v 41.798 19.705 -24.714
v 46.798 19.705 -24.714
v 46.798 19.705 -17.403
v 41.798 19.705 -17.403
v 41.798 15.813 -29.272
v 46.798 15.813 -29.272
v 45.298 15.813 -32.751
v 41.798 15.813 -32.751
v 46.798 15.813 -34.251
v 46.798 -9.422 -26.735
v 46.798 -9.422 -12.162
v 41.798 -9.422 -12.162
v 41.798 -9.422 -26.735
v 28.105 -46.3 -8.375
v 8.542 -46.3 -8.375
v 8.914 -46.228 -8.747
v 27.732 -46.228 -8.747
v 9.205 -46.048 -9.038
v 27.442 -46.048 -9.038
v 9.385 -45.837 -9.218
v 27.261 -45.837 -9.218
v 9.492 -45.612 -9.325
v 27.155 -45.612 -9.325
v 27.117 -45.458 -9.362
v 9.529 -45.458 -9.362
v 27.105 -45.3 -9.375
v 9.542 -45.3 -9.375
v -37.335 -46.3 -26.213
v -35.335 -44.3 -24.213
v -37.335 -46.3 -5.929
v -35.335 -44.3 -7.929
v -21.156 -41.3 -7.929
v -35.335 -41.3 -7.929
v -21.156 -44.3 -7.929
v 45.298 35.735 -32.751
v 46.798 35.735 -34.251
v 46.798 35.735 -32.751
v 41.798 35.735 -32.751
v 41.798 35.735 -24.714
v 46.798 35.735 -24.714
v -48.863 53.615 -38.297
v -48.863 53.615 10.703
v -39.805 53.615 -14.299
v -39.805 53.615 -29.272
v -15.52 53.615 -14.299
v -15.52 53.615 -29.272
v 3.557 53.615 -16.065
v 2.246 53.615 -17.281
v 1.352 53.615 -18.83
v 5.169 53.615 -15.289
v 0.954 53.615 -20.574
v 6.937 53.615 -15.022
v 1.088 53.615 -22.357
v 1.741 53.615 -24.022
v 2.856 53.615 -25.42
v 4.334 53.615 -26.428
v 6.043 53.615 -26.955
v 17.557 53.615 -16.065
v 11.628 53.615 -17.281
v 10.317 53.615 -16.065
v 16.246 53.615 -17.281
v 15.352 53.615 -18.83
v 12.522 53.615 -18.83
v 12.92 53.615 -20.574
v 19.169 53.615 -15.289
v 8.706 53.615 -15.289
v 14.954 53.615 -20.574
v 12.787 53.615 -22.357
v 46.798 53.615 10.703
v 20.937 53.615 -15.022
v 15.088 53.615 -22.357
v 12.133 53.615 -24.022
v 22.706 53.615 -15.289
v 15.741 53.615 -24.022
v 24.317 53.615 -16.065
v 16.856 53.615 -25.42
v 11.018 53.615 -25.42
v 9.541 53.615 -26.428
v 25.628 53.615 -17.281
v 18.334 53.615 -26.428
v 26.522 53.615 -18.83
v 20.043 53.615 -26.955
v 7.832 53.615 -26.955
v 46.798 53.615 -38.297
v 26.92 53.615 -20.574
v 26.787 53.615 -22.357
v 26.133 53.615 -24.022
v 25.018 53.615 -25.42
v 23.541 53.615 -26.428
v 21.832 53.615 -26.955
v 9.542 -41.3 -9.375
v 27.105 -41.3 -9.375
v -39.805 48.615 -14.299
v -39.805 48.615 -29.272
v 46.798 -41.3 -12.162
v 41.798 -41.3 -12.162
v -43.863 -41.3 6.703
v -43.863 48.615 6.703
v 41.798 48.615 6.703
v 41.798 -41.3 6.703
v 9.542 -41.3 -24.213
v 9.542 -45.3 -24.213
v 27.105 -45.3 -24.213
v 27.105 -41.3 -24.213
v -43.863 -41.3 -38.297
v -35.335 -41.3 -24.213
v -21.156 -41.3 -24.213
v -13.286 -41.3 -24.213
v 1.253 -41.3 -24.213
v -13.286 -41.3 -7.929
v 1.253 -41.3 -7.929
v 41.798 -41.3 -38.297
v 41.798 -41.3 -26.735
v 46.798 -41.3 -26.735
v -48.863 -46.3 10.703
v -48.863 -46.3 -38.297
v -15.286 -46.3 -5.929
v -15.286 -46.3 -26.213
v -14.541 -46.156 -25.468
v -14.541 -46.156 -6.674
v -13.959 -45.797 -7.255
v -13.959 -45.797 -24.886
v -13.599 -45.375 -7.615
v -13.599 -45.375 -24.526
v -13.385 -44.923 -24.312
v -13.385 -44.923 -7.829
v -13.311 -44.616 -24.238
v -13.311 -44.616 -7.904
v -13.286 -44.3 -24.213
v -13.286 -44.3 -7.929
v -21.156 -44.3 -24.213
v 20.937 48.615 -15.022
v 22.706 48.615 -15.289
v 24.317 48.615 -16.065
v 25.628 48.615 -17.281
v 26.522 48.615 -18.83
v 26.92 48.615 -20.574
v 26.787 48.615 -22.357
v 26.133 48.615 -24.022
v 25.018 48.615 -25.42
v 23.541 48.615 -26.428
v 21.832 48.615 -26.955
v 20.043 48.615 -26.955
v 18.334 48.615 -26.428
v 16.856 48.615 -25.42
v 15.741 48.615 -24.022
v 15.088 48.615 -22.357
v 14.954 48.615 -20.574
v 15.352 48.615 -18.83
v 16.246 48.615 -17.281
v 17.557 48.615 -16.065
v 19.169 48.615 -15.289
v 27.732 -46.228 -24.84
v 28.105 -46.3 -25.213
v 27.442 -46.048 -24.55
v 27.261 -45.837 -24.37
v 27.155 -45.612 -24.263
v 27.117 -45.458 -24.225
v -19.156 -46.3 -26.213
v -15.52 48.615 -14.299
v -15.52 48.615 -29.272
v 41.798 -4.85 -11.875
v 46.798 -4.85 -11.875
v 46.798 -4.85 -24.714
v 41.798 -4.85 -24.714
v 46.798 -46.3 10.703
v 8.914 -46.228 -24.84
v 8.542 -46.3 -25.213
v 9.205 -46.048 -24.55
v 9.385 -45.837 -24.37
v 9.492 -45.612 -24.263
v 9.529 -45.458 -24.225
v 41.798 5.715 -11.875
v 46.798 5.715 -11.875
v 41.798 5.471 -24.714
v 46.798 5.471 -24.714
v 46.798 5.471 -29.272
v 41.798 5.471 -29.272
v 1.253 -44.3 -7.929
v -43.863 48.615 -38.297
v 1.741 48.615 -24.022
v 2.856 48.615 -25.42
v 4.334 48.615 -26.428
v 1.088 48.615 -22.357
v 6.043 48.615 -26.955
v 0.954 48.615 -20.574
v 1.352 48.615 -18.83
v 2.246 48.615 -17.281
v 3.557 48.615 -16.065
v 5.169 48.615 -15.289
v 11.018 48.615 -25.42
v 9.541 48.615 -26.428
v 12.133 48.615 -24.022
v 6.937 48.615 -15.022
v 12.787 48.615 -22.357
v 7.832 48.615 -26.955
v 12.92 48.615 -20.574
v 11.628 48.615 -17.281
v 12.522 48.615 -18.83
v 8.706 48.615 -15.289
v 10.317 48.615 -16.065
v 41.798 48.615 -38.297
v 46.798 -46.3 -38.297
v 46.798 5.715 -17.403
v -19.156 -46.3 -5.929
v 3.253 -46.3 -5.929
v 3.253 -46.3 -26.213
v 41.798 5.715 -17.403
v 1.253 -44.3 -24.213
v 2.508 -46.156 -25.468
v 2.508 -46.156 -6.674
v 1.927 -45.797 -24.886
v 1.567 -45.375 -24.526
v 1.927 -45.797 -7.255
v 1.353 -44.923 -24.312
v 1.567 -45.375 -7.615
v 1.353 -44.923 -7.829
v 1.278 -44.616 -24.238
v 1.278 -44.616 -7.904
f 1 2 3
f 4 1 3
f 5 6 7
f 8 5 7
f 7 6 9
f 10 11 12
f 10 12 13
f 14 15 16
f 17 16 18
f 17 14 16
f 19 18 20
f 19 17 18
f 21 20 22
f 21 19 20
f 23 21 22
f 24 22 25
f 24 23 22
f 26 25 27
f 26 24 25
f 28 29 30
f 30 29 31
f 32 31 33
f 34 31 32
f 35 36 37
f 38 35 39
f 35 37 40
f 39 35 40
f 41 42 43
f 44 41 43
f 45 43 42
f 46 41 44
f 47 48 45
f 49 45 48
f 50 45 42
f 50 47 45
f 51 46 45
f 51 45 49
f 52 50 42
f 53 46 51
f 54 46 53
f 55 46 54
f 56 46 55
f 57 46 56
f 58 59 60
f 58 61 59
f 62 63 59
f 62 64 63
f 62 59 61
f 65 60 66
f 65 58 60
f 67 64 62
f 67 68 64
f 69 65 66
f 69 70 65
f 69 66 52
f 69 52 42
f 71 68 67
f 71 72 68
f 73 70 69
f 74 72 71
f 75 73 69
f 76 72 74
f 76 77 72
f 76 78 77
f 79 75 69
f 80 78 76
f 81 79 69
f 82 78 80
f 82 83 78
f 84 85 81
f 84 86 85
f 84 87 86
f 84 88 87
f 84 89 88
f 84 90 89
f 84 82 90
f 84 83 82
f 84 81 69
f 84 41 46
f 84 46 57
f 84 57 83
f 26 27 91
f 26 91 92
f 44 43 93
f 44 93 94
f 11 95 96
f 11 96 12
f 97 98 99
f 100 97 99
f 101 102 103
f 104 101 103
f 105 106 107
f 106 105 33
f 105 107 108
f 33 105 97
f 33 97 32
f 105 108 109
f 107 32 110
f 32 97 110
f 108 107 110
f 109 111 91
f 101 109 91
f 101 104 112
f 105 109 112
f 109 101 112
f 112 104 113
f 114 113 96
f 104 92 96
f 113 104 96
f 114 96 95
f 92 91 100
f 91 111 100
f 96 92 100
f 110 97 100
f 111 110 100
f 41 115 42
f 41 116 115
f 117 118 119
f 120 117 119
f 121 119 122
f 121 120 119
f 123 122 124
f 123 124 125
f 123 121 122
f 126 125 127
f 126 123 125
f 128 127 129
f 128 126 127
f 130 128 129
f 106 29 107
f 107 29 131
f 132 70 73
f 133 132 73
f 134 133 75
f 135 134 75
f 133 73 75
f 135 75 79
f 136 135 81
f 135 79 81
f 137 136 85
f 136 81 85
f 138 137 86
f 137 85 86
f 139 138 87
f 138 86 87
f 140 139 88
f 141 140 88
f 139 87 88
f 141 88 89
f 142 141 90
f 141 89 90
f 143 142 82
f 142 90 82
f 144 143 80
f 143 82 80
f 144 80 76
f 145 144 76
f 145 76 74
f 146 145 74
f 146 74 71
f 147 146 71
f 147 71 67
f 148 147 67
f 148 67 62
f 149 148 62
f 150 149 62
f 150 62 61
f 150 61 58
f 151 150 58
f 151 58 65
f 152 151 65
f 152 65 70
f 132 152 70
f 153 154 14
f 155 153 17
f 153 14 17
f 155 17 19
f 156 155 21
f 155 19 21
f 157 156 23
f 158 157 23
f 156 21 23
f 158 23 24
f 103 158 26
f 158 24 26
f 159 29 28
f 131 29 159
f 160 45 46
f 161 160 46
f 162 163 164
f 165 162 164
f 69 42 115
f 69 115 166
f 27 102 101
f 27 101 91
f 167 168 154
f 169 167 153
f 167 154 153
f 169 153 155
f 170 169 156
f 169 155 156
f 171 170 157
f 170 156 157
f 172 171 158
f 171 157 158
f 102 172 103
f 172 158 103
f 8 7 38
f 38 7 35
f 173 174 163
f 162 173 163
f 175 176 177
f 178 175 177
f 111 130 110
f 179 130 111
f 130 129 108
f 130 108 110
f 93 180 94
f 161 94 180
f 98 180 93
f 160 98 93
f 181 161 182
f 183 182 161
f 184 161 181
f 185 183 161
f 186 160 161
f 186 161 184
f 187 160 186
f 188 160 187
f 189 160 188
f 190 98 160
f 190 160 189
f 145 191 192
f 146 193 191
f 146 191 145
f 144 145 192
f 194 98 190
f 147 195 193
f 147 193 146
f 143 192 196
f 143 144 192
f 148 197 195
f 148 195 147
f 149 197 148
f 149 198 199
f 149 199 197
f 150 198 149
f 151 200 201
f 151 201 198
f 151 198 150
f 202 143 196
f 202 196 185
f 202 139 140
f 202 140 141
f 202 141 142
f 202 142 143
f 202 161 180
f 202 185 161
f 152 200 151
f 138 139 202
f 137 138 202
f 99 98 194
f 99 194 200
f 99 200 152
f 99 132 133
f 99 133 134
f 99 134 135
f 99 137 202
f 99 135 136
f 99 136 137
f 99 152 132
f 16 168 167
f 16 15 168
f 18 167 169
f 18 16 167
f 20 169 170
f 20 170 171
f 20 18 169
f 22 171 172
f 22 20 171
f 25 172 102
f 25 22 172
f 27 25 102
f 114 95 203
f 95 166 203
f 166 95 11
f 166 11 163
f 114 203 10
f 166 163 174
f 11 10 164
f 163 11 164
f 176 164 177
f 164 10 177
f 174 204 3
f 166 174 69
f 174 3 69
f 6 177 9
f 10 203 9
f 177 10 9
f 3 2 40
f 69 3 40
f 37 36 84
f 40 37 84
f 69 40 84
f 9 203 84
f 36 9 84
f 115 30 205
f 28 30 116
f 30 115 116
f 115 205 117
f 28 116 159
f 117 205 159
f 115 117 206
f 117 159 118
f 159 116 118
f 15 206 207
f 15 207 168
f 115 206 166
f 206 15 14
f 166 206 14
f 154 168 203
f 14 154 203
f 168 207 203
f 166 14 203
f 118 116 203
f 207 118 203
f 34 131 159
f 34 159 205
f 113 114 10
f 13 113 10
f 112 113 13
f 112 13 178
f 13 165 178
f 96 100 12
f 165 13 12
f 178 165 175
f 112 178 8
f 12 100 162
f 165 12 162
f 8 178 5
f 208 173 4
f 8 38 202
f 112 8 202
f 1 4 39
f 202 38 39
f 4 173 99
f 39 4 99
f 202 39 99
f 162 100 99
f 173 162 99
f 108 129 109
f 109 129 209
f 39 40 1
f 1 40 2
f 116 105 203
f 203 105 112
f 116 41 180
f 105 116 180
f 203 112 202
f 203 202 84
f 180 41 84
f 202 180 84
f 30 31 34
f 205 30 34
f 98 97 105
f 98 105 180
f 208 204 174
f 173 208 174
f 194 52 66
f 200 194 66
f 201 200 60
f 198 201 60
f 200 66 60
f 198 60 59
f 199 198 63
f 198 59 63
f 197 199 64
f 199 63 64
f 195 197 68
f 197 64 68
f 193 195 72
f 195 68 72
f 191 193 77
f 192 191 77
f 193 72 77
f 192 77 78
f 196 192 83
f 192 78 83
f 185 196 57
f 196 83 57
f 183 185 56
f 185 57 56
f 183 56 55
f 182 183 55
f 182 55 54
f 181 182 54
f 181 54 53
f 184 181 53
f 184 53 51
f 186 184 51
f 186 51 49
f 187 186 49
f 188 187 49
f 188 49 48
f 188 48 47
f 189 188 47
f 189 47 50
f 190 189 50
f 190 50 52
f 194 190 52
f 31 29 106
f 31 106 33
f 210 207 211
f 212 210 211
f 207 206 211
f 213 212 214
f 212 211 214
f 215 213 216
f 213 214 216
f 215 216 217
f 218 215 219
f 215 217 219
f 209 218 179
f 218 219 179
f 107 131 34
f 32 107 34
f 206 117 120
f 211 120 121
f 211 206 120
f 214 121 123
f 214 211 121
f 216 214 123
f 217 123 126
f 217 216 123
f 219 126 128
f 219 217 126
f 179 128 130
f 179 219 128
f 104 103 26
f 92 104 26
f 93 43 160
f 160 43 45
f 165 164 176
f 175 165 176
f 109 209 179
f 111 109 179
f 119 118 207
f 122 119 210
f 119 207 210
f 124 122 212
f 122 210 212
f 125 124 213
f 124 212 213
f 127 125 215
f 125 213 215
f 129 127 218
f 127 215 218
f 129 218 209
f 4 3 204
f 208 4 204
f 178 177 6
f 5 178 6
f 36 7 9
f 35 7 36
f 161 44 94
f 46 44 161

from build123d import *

# Parameters (mm, degrees)
SCHIZZO2_W                = 95.661065857
SCHIZZO2_H                = 99.914617901
SCHIZZO2_W_2              = 85.661065857
SCHIZZO2_H_2              = 89.914617901
ESTRUSIONE_SOTTILE1_DEPTH = 45
SCHIZZO5_W                = 14.572404991
SCHIZZO5_H                = 31.877712984
TAGLIO_ESTRUSIONE2_DEPTH  = 5
SCHIZZO6_W                = 17.563316518
SCHIZZO6_H                = 14.837974299
SCHIZZO6_W_2              = 14.53926904
SCHIZZO6_H_2              = 16.284185158
SCHIZZO6_W_3              = 14.178791295
TAGLIO_ESTRUSIONE3_DEPTH  = 5
SMUSSO5_SIZE              = 2
SMUSSO6_SIZE              = 1.5
SKETCH1_R                 = 6
SKETCH1_W                 = 24.285177085
SKETCH1_H                 = 14.972609064
CUT_EXTRUDE1_DEPTH        = 10
FILLET1_R                 = 2
FILLET2_R                 = 1
SKETCH2_W                 = 95.661065857
SKETCH2_H                 = 99.914617901
BOSS_EXTRUDE1_DEPTH       = 4


with BuildPart() as part:
    # Schizzo2 → Estrusione-Sottile1 (new body)
    with BuildSketch(Plane.XY.offset(6.703232706)):
        with Locations((-1.032219499, 3.65730895)):
            Rectangle(SCHIZZO2_W, SCHIZZO2_H)
        with Locations((-1.032219499, 3.65730895)):
            Rectangle(SCHIZZO2_W_2, SCHIZZO2_H_2, mode=Mode.SUBTRACT)
    extrude(amount=-ESTRUSIONE_SOTTILE1_DEPTH)

    # Schizzo5 → Taglio-Estrusione2 (cut)
    with BuildSketch(Plane(origin=(46.798313429, 0, 0), x_dir=(0, 0, -1), z_dir=(1, 0, 0))):
        Polygon((32.751075083, 35.734689364), (24.713552886, 35.734689364), (24.713552886, 19.705476421), (17.402976387, 19.705476421), (17.402976387, 5.715425641), (11.875438841, 5.715425641), (11.875438841, 5.226263026), (11.875438841, -4.850486837), (24.713552886, -4.850486837), (24.713552886, 5.470844333), (29.271954363, 5.470844333), (29.271954363, 15.813468704), (32.751075083, 15.813468704), align=None)
        with Locations((19.448395228, -25.361143508)):
            Rectangle(SCHIZZO5_W, SCHIZZO5_H)
    extrude(amount=-TAGLIO_ESTRUSIONE2_DEPTH, mode=Mode.SUBTRACT)

    # Schizzo6 → Taglio-Estrusione3 (cut)
    with BuildSketch(Plane.XZ.offset(46.3)):
        with Locations((18.323185023, -16.793891295)):
            Rectangle(SCHIZZO6_W, SCHIZZO6_H)
        with Locations((-6.016266439, -16.070785866)):
            Rectangle(SCHIZZO6_W_2, SCHIZZO6_H_2)
        with Locations((-28.245727369, -16.070785866)):
            Rectangle(SCHIZZO6_W_3, SCHIZZO6_H_2)
    extrude(amount=-TAGLIO_ESTRUSIONE3_DEPTH, mode=Mode.SUBTRACT)

    # Smusso5
    smusso5_edges = [part.edges().sort_by_distance(p)[0] for p in [
        (-21.156331721, -46.3, -16.070785866),
        (-28.245727368, -46.3, -24.212878445),
        (-35.335123016, -46.3, -16.070785866),
        (-28.245727368, -46.3, -7.928693287),
    ]]
    chamfer(smusso5_edges, length=SMUSSO5_SIZE)

    # Smusso6
    smusso6_edges = [part.edges().sort_by_distance(p)[0] for p in [
        (46.798313429, 25.774079034, -32.751075083),
    ]]
    chamfer(smusso6_edges, length=SMUSSO6_SIZE)

    # Sketch1 → Cut-Extrude1 (cut)
    with BuildSketch(Plane(origin=(0, 53.614617901, 0), x_dir=(1, 0, 0), z_dir=(0, 1, 0))):
        with Locations((20.937247572, 21.021954363)):
            Circle(SKETCH1_R)
        with Locations((6.937247572, 21.021954363)):
            Circle(SKETCH1_R)
        with Locations((-27.662752428, 21.785649831)):
            Rectangle(SKETCH1_W, SKETCH1_H)
    extrude(amount=-CUT_EXTRUDE1_DEPTH, mode=Mode.SUBTRACT)

    # Fillet1
    fillet1_edges = [part.edges().sort_by_distance(p)[0] for p in [
        (-6.016266439, -46.3, -24.212878445),
        (1.253368081, -46.3, -16.070785866),
        (-6.016266439, -46.3, -7.928693287),
        (-13.285900959, -46.3, -16.070785866),
    ]]
    fillet(fillet1_edges, radius=FILLET1_R)

    # Fillet2
    fillet2_edges = [part.edges().sort_by_distance(p)[0] for p in [
        (27.104843282, -46.3, -16.793891295),
        (18.323185023, -46.3, -9.374904146),
        (9.541526764, -46.3, -16.793891295),
        (18.323185023, -46.3, -24.212878445),
    ]]
    fillet(fillet2_edges, radius=FILLET2_R)

    # Sketch2 → Boss-Extrude1 (add)
    with BuildSketch(Plane.XY.offset(6.703232706)):
        with Locations((-1.032219499, 3.65730895)):
            Rectangle(SKETCH2_W, SKETCH2_H)
    extrude(amount=BOSS_EXTRUDE1_DEPTH)


solid = part.part
